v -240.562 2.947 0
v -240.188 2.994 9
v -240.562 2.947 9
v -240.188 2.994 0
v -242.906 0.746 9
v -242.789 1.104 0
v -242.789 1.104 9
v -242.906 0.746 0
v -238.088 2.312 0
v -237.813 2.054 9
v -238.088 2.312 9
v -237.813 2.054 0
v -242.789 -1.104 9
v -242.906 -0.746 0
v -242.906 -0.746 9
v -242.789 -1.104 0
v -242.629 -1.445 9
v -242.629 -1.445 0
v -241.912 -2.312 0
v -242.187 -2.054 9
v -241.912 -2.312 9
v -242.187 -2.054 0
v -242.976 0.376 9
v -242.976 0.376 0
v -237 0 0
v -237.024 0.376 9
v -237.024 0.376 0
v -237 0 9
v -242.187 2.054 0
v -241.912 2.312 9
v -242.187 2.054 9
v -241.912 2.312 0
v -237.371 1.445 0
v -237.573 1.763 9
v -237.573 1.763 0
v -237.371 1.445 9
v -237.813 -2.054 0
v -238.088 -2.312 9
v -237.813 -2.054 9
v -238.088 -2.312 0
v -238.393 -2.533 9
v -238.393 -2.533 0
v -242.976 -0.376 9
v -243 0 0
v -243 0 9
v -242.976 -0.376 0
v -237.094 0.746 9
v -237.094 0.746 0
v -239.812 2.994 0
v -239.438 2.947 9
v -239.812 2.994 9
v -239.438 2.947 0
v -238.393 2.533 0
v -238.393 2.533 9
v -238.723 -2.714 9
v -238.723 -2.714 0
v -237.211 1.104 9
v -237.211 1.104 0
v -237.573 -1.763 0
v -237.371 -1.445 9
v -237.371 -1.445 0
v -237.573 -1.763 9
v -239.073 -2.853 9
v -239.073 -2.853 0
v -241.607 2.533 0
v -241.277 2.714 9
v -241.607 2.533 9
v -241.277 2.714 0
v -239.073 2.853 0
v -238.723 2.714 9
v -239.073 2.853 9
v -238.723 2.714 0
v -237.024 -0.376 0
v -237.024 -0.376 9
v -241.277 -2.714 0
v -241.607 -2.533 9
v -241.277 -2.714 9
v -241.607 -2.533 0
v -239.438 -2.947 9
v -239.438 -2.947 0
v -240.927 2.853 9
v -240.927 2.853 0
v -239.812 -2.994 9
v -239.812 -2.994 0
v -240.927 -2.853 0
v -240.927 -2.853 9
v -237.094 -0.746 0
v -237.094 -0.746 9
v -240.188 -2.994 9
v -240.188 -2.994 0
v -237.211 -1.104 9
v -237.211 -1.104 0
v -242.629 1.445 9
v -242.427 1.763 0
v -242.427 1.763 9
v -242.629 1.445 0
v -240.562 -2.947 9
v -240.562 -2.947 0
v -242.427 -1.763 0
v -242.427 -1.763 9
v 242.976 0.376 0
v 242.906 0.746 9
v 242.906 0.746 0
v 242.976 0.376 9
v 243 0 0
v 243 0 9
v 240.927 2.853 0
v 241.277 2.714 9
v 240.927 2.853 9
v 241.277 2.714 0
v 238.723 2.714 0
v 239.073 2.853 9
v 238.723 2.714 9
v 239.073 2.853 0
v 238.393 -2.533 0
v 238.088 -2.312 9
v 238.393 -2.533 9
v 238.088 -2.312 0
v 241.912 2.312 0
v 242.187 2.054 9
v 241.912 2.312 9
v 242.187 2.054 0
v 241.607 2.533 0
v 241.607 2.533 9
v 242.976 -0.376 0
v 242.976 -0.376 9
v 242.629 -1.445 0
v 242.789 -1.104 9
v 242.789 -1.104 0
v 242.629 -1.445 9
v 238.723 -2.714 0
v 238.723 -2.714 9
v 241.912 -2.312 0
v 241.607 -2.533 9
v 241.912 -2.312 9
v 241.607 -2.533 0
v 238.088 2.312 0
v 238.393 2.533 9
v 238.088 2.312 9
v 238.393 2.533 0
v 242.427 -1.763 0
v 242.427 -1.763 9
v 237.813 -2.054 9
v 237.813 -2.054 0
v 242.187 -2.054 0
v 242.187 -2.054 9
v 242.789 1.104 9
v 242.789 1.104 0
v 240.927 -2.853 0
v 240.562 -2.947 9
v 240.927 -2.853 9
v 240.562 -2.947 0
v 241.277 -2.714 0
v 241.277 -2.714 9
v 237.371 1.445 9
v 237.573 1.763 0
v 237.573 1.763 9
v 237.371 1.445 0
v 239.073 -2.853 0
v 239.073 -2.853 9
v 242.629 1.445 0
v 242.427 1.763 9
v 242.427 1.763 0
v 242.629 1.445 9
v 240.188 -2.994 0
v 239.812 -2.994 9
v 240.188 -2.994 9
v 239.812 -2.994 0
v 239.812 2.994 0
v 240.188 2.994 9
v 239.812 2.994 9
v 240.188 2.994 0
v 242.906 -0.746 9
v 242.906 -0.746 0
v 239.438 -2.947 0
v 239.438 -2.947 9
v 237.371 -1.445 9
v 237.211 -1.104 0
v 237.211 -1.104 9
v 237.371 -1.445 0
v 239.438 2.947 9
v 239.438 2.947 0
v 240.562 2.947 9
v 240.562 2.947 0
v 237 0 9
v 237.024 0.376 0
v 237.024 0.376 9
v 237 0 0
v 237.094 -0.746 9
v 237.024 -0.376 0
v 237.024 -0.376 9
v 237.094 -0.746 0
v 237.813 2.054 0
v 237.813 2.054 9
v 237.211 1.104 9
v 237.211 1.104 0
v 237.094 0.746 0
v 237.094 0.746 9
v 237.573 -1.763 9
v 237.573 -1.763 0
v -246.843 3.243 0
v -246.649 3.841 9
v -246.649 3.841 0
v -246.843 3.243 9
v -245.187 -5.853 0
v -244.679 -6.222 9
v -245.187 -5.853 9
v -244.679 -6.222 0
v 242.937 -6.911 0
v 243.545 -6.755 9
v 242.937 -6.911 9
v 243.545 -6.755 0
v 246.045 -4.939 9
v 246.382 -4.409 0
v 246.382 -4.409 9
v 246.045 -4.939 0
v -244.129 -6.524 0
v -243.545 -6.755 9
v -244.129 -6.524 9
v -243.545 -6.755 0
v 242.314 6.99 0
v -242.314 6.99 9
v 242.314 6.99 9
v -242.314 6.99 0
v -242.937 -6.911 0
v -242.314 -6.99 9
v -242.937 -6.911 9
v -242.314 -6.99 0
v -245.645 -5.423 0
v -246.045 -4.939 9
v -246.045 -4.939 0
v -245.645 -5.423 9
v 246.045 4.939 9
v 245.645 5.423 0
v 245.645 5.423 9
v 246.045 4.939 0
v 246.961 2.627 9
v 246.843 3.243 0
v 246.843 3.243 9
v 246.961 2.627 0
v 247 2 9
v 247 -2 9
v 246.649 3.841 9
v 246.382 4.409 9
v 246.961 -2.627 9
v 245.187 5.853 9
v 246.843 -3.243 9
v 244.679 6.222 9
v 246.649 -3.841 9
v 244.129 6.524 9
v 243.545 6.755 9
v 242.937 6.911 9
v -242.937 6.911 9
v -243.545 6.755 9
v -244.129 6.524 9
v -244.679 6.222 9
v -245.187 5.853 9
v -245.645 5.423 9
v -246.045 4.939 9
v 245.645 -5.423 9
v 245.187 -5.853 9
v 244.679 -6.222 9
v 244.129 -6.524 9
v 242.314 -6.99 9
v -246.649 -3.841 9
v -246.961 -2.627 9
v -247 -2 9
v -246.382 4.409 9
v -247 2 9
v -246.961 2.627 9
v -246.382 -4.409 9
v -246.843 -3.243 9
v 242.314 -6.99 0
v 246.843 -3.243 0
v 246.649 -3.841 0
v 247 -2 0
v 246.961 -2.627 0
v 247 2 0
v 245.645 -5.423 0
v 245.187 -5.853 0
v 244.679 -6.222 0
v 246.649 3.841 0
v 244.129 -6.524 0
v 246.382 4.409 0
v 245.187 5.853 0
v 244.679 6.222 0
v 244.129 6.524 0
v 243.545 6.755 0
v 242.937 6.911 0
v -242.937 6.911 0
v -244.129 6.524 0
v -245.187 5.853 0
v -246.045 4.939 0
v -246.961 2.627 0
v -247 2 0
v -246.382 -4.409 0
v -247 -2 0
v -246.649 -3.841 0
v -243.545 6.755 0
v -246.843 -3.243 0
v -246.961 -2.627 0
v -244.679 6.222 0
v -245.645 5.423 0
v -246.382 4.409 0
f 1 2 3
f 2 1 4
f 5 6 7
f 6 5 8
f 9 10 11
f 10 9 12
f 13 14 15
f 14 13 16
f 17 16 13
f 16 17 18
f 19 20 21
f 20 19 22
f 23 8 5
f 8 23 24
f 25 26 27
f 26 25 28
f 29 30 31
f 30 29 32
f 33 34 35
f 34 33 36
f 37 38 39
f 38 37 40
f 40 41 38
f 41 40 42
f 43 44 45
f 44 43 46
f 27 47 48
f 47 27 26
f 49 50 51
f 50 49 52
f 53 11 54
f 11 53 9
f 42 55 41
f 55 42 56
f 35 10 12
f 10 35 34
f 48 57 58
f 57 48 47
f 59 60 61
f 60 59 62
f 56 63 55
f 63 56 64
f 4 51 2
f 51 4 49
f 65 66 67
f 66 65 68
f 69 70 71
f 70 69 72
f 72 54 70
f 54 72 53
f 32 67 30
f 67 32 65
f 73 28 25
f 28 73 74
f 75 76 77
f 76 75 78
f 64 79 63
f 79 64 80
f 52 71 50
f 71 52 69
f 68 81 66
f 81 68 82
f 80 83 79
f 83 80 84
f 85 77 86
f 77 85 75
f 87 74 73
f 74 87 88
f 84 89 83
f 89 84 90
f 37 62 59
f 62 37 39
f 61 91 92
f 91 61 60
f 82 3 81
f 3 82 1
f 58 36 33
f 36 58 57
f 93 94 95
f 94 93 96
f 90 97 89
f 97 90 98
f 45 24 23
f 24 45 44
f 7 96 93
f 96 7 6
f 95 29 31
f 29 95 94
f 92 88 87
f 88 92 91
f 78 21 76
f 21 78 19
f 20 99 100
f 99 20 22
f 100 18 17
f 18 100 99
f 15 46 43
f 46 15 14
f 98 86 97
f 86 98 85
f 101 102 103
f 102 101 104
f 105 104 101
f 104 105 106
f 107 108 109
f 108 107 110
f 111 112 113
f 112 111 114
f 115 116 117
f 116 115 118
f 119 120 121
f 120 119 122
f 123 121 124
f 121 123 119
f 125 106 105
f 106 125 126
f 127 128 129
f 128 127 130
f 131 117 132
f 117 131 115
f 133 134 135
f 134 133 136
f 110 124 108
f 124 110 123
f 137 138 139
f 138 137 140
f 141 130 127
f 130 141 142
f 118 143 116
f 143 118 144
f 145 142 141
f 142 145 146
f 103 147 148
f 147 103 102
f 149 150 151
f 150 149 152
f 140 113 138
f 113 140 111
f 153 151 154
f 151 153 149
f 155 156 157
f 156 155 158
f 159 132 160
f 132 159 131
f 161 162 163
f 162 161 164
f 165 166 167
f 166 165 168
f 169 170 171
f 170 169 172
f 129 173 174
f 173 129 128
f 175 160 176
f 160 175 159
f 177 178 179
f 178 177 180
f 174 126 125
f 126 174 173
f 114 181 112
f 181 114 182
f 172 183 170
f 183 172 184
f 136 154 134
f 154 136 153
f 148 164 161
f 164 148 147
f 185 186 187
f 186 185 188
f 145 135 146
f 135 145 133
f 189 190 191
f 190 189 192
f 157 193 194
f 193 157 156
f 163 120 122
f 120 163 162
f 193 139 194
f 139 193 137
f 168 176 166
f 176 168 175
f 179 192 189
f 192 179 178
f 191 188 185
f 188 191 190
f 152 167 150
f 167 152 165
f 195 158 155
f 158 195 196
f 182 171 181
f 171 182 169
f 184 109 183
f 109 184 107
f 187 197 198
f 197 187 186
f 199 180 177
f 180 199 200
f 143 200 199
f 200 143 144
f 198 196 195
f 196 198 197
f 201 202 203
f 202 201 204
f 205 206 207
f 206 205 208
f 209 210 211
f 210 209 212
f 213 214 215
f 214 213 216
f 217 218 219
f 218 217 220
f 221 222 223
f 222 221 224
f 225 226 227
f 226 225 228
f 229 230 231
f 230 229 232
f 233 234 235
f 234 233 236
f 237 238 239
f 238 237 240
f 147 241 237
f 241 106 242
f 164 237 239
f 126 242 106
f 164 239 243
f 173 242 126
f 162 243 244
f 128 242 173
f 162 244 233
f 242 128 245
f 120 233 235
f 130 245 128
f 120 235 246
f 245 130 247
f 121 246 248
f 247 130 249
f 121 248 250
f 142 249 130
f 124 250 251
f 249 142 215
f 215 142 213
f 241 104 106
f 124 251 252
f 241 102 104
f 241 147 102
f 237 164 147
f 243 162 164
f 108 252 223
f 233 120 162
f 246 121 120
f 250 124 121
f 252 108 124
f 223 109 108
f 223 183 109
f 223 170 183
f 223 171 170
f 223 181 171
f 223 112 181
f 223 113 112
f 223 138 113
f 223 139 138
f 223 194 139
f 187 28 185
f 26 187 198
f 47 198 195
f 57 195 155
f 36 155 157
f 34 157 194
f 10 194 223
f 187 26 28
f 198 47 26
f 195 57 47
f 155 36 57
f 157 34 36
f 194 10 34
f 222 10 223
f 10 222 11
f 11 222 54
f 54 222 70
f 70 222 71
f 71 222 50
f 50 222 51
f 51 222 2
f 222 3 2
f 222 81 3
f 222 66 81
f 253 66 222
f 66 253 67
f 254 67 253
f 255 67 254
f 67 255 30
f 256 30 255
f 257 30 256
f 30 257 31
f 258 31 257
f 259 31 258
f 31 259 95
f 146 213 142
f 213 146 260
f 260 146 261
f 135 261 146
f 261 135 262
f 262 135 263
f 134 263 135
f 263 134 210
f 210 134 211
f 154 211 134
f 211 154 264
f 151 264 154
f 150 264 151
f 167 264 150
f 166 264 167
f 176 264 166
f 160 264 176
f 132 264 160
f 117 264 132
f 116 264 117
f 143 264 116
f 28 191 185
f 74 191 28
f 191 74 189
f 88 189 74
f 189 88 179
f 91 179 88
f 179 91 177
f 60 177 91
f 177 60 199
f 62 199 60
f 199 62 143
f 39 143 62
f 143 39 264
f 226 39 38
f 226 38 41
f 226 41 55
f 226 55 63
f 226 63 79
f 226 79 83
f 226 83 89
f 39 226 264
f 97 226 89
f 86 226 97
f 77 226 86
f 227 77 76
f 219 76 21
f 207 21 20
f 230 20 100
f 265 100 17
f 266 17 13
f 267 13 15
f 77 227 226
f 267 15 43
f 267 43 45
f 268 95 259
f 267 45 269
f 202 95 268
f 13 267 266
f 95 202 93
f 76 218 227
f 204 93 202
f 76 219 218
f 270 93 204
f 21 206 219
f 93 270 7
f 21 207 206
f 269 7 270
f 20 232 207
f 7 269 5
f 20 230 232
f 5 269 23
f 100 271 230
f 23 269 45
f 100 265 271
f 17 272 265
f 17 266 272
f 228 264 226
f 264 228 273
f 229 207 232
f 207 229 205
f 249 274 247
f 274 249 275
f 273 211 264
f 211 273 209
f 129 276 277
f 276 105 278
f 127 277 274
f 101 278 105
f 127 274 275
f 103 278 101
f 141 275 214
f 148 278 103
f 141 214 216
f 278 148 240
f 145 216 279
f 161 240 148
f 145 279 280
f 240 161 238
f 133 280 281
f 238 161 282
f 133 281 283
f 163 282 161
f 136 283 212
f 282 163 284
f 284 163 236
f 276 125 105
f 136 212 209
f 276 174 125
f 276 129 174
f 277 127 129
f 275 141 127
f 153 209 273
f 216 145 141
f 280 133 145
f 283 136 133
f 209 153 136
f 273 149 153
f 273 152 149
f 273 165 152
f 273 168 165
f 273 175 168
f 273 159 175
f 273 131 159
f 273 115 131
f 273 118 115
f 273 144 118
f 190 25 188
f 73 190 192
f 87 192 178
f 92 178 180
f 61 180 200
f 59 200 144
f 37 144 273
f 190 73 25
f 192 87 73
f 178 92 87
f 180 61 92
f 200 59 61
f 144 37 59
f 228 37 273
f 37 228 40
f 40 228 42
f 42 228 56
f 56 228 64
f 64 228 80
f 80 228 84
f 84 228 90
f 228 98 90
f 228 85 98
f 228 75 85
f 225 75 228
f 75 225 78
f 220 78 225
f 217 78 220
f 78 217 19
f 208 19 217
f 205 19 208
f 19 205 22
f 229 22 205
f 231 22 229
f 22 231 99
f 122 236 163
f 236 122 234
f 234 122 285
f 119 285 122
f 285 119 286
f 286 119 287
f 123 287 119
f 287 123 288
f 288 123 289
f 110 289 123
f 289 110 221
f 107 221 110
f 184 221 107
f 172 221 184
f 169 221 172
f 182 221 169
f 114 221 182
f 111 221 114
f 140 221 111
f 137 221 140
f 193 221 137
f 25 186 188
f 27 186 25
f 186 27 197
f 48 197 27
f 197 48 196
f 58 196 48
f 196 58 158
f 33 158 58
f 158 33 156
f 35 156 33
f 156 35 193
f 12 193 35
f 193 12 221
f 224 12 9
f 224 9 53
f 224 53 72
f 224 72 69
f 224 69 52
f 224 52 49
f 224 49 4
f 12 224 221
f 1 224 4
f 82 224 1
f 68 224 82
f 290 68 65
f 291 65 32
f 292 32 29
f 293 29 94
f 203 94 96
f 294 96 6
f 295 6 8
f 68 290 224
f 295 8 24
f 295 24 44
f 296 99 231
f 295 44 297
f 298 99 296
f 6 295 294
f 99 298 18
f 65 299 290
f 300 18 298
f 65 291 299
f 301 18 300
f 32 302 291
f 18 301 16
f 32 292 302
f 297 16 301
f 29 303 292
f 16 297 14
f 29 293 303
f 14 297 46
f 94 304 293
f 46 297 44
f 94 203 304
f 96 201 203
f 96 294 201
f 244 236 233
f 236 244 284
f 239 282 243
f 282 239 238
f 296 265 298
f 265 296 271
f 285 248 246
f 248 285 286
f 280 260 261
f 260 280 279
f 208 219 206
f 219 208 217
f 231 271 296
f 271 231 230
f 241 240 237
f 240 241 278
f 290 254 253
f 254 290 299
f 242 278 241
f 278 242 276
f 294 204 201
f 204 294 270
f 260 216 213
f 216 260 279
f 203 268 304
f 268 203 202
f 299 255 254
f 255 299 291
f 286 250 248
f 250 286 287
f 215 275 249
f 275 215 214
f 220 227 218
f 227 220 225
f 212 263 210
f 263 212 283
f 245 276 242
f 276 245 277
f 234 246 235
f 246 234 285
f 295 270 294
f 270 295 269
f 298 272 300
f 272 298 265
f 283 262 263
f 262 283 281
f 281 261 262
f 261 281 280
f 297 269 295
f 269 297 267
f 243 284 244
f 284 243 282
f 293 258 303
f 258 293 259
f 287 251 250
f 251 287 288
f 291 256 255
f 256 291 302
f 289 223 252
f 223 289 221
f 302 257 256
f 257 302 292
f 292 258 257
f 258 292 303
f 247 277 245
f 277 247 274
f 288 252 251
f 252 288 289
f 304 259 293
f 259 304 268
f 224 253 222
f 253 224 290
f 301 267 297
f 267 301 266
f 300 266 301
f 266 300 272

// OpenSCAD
$fn = 50;


difference() {
	union() {
		hull() {
			translate(v = [-242.0000000000, 2.0000000000, 0]) {
				cylinder(h = 9, r = 5);
			}
			translate(v = [242.0000000000, 2.0000000000, 0]) {
				cylinder(h = 9, r = 5);
			}
			translate(v = [-242.0000000000, -2.0000000000, 0]) {
				cylinder(h = 9, r = 5);
			}
			translate(v = [242.0000000000, -2.0000000000, 0]) {
				cylinder(h = 9, r = 5);
			}
		}
	}
	union() {
		translate(v = [-240.0000000000, 0.0000000000, -100.0000000000]) {
			cylinder(h = 200, r = 3.0000000000);
		}
		translate(v = [-240.0000000000, 0.0000000000, -100.0000000000]) {
			cylinder(h = 200, r = 3.0000000000);
		}
		translate(v = [240.0000000000, 0.0000000000, -100.0000000000]) {
			cylinder(h = 200, r = 3.0000000000);
		}
		translate(v = [240.0000000000, 0.0000000000, -100.0000000000]) {
			cylinder(h = 200, r = 3.0000000000);
		}
	}
}
